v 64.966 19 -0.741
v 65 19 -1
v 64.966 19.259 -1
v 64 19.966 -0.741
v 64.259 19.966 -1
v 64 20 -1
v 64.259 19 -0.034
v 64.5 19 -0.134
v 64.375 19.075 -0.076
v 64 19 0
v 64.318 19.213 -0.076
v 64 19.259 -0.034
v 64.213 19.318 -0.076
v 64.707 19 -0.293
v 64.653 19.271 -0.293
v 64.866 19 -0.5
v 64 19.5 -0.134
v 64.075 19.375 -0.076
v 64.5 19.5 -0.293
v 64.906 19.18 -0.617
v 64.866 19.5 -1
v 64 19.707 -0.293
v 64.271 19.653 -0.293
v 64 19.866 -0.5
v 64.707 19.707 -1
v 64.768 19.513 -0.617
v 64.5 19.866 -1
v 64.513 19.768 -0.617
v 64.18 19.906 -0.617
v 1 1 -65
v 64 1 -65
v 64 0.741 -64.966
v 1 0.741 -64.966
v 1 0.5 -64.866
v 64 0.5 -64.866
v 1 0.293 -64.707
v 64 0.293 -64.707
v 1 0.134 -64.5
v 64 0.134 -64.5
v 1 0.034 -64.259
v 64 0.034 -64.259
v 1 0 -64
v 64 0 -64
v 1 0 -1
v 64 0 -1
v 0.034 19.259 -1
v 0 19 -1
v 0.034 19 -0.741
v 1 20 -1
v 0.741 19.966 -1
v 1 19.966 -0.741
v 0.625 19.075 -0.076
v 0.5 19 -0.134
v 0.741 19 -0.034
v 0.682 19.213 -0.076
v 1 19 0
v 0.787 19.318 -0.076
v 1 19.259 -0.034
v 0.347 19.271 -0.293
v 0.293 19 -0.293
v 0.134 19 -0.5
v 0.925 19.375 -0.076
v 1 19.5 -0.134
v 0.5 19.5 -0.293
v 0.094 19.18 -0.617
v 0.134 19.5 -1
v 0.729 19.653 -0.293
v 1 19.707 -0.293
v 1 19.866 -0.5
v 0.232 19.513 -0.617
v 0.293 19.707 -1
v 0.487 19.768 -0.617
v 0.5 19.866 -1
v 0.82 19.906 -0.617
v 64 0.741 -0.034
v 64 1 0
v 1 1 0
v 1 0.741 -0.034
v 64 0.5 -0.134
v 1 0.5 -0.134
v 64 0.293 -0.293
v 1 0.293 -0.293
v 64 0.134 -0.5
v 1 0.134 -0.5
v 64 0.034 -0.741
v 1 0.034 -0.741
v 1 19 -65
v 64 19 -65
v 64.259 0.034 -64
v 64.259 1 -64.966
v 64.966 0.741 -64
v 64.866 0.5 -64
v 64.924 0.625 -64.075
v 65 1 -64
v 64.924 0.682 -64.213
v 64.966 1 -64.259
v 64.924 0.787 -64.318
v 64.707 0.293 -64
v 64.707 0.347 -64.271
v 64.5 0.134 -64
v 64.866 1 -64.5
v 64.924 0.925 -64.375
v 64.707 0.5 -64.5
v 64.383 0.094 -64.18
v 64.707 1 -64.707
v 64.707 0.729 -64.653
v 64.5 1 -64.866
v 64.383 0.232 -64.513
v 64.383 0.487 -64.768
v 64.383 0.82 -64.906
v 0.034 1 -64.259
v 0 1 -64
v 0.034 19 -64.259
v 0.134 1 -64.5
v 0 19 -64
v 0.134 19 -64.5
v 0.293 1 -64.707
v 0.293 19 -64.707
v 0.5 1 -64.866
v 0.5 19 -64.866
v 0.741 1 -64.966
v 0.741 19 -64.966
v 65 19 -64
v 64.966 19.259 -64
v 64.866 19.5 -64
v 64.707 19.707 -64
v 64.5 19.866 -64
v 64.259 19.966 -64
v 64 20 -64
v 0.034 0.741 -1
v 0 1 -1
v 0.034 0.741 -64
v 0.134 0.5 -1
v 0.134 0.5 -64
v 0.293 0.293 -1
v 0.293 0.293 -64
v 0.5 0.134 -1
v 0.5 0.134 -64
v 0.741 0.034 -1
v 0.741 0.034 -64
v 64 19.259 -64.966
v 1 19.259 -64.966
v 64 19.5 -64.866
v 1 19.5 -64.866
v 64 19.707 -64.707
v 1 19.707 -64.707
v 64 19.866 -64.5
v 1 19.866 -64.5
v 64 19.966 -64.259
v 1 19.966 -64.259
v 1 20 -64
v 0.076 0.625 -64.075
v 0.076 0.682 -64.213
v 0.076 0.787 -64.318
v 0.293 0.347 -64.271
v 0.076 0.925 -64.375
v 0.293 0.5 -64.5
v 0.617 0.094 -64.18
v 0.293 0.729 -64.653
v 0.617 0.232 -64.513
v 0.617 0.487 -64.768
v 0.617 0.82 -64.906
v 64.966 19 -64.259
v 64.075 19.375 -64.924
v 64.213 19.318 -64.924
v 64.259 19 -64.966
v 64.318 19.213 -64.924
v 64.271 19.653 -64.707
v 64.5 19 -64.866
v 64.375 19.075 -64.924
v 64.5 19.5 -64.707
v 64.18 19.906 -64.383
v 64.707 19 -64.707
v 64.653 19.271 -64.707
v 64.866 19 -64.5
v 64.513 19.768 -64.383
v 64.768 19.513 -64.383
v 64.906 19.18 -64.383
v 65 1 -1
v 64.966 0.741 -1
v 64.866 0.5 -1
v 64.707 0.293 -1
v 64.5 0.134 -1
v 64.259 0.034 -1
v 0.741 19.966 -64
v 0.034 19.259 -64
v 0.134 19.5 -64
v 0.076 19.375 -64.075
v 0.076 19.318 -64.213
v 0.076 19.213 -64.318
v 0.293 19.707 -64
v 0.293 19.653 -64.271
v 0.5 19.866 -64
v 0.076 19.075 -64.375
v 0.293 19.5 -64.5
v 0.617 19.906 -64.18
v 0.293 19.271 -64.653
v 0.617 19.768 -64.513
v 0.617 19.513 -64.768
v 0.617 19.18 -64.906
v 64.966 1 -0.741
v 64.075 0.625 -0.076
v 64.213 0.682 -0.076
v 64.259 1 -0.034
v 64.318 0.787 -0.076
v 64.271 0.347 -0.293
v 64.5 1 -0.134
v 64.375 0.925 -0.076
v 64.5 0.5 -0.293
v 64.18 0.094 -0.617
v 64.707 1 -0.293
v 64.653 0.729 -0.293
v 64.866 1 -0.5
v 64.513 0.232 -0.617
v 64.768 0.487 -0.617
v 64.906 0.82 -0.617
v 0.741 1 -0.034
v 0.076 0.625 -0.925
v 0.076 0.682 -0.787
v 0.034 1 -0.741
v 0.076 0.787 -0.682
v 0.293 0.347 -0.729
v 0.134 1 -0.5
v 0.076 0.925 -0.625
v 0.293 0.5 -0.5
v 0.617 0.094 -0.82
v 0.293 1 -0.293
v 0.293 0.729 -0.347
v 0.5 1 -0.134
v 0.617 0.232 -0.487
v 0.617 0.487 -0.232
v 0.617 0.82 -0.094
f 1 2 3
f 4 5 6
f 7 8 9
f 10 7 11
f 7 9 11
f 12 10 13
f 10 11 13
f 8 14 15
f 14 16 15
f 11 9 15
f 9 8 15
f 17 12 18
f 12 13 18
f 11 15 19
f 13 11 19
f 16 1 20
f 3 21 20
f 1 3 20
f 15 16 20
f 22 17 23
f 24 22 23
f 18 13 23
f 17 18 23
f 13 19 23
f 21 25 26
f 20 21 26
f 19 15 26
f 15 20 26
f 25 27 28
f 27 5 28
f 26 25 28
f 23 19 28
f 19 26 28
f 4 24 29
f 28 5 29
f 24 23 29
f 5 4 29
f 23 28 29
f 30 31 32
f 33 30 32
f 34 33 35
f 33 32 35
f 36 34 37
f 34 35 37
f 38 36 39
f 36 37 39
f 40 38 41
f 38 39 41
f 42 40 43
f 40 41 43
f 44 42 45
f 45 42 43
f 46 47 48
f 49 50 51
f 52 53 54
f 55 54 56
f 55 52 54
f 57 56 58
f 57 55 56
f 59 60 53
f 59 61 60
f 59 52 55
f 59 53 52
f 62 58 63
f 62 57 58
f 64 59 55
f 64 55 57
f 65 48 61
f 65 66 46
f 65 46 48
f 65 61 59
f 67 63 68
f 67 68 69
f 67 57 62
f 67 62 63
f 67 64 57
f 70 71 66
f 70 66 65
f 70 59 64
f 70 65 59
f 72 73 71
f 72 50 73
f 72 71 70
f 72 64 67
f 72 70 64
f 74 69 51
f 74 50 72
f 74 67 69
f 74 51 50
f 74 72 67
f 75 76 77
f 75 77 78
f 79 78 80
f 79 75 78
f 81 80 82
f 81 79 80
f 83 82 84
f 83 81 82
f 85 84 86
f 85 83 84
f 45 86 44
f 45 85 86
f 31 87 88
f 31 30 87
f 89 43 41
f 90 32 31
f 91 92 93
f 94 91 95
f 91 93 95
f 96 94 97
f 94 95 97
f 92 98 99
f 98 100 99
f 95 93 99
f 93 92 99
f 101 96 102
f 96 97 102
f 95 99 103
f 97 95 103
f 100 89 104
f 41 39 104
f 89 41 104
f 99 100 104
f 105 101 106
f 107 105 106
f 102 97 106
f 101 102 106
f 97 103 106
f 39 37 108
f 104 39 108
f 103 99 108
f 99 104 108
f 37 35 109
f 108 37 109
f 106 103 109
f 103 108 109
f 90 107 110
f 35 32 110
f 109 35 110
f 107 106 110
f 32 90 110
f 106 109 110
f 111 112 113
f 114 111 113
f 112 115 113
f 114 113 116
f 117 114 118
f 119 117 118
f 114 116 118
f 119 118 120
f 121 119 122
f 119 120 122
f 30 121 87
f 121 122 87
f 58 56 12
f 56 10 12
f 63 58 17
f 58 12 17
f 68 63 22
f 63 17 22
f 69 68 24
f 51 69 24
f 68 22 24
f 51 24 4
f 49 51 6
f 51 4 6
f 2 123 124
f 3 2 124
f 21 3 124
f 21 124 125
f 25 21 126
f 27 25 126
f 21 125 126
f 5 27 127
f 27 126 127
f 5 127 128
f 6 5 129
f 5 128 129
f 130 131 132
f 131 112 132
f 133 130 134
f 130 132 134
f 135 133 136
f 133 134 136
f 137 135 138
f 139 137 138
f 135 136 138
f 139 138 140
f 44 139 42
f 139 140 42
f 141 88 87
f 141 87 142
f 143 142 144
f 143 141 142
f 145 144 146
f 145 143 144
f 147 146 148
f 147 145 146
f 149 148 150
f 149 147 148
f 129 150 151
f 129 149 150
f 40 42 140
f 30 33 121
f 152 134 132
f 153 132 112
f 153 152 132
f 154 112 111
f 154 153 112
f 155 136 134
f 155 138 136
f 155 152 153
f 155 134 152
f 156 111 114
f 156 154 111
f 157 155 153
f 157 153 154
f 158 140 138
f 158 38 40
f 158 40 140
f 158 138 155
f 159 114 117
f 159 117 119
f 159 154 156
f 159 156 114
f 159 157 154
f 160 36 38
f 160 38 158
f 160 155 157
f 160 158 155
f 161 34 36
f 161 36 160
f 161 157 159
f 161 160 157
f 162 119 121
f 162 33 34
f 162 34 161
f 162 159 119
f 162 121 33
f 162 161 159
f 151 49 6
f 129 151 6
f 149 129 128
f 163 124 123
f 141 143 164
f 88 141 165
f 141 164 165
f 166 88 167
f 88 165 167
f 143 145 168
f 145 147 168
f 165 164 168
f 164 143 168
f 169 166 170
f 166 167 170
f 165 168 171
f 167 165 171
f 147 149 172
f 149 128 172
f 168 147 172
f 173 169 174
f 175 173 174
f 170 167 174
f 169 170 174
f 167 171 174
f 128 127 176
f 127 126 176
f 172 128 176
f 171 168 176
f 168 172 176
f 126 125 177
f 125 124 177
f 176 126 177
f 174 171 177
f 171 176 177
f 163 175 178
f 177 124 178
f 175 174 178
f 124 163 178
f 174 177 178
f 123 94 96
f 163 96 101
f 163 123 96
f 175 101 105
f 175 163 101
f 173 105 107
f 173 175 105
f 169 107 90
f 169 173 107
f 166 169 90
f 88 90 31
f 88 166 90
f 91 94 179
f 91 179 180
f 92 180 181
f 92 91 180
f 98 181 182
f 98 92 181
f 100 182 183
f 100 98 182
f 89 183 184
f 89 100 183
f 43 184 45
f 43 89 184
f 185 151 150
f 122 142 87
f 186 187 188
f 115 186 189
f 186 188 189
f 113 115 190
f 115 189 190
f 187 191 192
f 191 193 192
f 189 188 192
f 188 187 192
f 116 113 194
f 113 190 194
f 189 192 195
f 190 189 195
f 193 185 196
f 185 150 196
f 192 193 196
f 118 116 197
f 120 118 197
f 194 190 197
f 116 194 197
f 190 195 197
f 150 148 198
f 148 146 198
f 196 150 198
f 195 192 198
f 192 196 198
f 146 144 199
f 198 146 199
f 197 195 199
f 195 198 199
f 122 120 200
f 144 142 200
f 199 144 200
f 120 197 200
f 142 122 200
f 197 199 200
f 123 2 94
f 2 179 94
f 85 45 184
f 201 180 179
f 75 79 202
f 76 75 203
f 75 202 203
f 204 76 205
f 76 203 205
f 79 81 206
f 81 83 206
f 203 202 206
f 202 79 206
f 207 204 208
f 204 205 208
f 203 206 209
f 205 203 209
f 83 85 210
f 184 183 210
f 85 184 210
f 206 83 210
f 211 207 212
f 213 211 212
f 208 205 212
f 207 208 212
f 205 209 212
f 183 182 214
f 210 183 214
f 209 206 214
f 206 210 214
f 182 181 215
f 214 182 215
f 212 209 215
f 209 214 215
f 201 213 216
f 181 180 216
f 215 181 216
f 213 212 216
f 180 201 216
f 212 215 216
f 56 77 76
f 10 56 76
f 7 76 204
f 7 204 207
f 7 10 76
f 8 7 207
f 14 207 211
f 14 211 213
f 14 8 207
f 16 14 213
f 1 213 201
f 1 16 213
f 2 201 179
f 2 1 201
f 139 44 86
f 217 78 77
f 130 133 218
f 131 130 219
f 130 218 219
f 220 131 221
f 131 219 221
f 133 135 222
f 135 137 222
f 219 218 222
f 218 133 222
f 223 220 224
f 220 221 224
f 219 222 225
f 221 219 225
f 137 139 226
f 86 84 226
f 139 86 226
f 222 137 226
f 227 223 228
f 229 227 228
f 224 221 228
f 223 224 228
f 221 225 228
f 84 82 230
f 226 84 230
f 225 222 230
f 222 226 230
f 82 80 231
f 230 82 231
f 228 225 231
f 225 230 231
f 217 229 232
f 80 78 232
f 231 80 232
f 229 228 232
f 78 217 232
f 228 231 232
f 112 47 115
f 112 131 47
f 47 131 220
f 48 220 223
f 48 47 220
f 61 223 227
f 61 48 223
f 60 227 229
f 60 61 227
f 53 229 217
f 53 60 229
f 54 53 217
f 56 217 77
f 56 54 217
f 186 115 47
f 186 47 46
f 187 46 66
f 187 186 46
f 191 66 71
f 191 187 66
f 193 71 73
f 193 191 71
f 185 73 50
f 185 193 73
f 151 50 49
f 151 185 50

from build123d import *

# Parameters (mm, degrees)
SKETCH1_W           = 65
SKETCH1_H           = 65
BOSS_EXTRUDE1_DEPTH = 20
FILLET1_R           = 1
BOSS_EXTRUDE2_DEPTH = 2


with BuildPart() as part:
    # Sketch1 → Boss-Extrude1 (new body)
    with BuildSketch(Plane(origin=(0, 0, 0), x_dir=(1, 0, 0), z_dir=(0, 1, 0))):
        with Locations((32.5, 32.5)):
            Rectangle(SKETCH1_W, SKETCH1_H)
    extrude(amount=BOSS_EXTRUDE1_DEPTH)

    # Fillet1
    fillet1_edges = [part.edges().sort_by_distance(p)[0] for p in [
        (65, 20, -32.5),
        (32.5, 20, -65),
        (0, 20, -32.5),
        (32.5, 0, -65),
        (65, 0, -32.5),
        (32.5, 0, 0),
        (0, 0, -32.5),
        (0, 10, -65),
        (65, 10, -65),
        (65, 10, 0),
        (0, 10, 0),
        (32.5, 20, 0),
    ]]
    fillet(fillet1_edges, radius=FILLET1_R)

    # Sketch5 → Boss-Extrude2 (add)
    with BuildSketch(Plane(origin=(0, 20, 0), x_dir=(1, 0, 0), z_dir=(0, 1, 0))):
        Polygon((19.685637492, 45.314362508), (24.766822527, 50.395547542), (25.276108448, 49.886261621), (20.194923413, 44.805076587), align=None)
        with BuildLine():
            Line((24.270811136, 43.09904656), (24.718807634, 42.493448688))
            add(Edge.make_bspline(
                [(24.718807634, 42.493448688), (24.65944603, 42.457112102), (24.543657841, 42.386235522), (24.36613492, 42.296211036), (24.192297686, 42.219040325), (24.01995098, 42.159212632), (23.849730523, 42.114752837), (23.681690942, 42.086719988), (23.516089318, 42.075383185), (23.353313359, 42.077400194), (23.19429728, 42.097465643), (23.038449433, 42.128495622), (22.887328161, 42.177860051), (22.740286195, 42.240265036), (22.597438103, 42.3173153), (22.45826992, 42.40727332), (22.32545788, 42.515129055), (22.241429087, 42.594556655), (22.198644924, 42.63499807)],
                knots=[0, 0, 0, 0, 0.000208722, 0.000407124, 0.000596633, 0.000778925, 0.00095377, 0.001123861, 0.001289171, 0.001451177, 0.001611365, 0.001769344, 0.001927175, 0.002087363, 0.002247969, 0.002413511, 0.002583753, 0.002760349, 0.002760349, 0.002760349, 0.002760349], degree=3))
            add(Edge.make_bspline(
                [(22.198644924, 42.63499807), (22.147701284, 42.688346884), (22.04765429, 42.793117339), (21.922554095, 42.967231051), (21.817569235, 43.147019722), (21.73659792, 43.335189786), (21.679785512, 43.530848968), (21.644085884, 43.733421879), (21.633386128, 43.943953589), (21.643285872, 44.161113728), (21.677814894, 44.38377928), (21.742580127, 44.606907144), (21.828375675, 44.832560204), (21.944279573, 45.056953333), (22.083016879, 45.284675208), (22.25070644, 45.510705787), (22.440615653, 45.740739094), (22.58325937, 45.886785575), (22.656856326, 45.962138185)],
                knots=[0, 0, 0, 0, 0.000221059, 0.000434133, 0.00064138, 0.000844681, 0.001046936, 0.001251338, 0.00146034, 0.001678012, 0.001902569, 0.002134488, 0.002373782, 0.002625691, 0.002890982, 0.003172935, 0.003469264, 0.003785121, 0.003785121, 0.003785121, 0.003785121], degree=3))
            add(Edge.make_bspline(
                [(22.656856326, 45.962138185), (22.735304815, 46.037955999), (22.88748258, 46.185030666), (23.123303486, 46.384632603), (23.357638034, 46.557100392), (23.590677334, 46.702822596), (23.821840648, 46.822078206), (24.051852, 46.914709279), (24.280409589, 46.981983021), (24.506932694, 47.018796963), (24.727384439, 47.03431778), (24.940233058, 47.025482357), (25.144352505, 46.994971105), (25.340085808, 46.942519294), (25.526286742, 46.866215225), (25.702710621, 46.766561684), (25.872394562, 46.647715855), (25.973496188, 46.551133092), (26.024856056, 46.502068817)],
                knots=[0, 0, 0, 0, 0.000327232, 0.000634778, 0.000926067, 0.001199391, 0.001458489, 0.001705352, 0.00194228, 0.002171628, 0.00239246, 0.002604236, 0.002809376, 0.003010444, 0.003210705, 0.003411263, 0.003617372, 0.003830186, 0.003830186, 0.003830186, 0.003830186], degree=3))
            add(Edge.make_bspline(
                [(26.024856056, 46.502068817), (26.071398533, 46.453066353), (26.163167054, 46.356447435), (26.277023523, 46.193668973), (26.37086823, 46.023021925), (26.443461426, 45.842869536), (26.493233934, 45.653122307), (26.520175644, 45.45373442), (26.527595943, 45.24544748), (26.512535805, 45.029344415), (26.475308317, 44.807364737), (26.409425794, 44.583426164), (26.320915695, 44.357268318), (26.201043695, 44.132062546), (26.060507567, 43.902626648), (25.89079672, 43.673437755), (25.696655056, 43.442073581), (25.552080753, 43.293670825), (25.477629063, 43.21724759)],
                knots=[0, 0, 0, 0, 0.000202508, 0.000399288, 0.000593897, 0.000785751, 0.000980426, 0.001180814, 0.001388159, 0.001604624, 0.001829655, 0.002061973, 0.002303688, 0.00255693, 0.002826235, 0.003110228, 0.003411606, 0.003731589, 0.003731589, 0.003731589, 0.003731589], degree=3))
            Line((25.477629063, 43.21724759), (25.308353514, 43.053809128))
            Line((25.308353514, 43.053809128), (23.055237576, 45.306925066))
            add(Edge.make_bspline(
                [(23.055237576, 45.306925066), (23.008428941, 45.253428574), (22.917532008, 45.149544603), (22.794995519, 44.99005008), (22.687606361, 44.834345409), (22.598042408, 44.680102339), (22.523988968, 44.528378877), (22.46893383, 44.377973841), (22.428484602, 44.230679765), (22.404672414, 44.086328807), (22.398574981, 43.946465898), (22.401417614, 43.812435439), (22.421043899, 43.684765665), (22.452728022, 43.563194715), (22.498625025, 43.448182852), (22.557092061, 43.339791827), (22.629175623, 43.237817936), (22.686267844, 43.176729605), (22.715227205, 43.145743263)],
                knots=[0, 0, 0, 0, 0.000213204, 0.000414017, 0.000603036, 0.00078024, 0.000948633, 0.00110884, 0.001259993, 0.001406336, 0.001546616, 0.001679481, 0.001807848, 0.00193315, 0.002055633, 0.002178385, 0.002301882, 0.002429006, 0.002429006, 0.002429006, 0.002429006], degree=3))
            add(Edge.make_bspline(
                [(22.715227205, 43.145743263), (22.763714327, 43.101268255), (22.858414682, 43.014403973), (23.025956737, 42.922340751), (23.204141766, 42.861085255), (23.396323147, 42.841646968), (23.600048933, 42.851176309), (23.814991722, 42.901604999), (24.042730565, 42.981679607), (24.192378727, 43.05868638), (24.270811136, 43.09904656)],
                knots=[0, 0, 0, 0, 0.000196748, 0.000384268, 0.000568853, 0.000758368, 0.000960006, 0.001178117, 0.001418122, 0.001682448, 0.001682448, 0.001682448, 0.001682448], degree=3))
        make_face()
        with BuildLine():
            Line((23.598086753, 45.788484819), (25.282086618, 44.104484954))
            add(Edge.make_bspline(
                [(25.282086618, 44.104484954), (25.317456152, 44.146521608), (25.385900663, 44.227867836), (25.479775603, 44.350787831), (25.561877228, 44.470464632), (25.632124497, 44.587358235), (25.691145975, 44.700570312), (25.736058611, 44.811350606), (25.773087872, 44.917520401), (25.786377298, 44.989073722), (25.792831811, 45.023826301)],
                knots=[0, 0, 0, 0, 0.000164794, 0.000318898, 0.0004638, 0.000599943, 0.000727861, 0.000846287, 0.000958423, 0.001064318, 0.001064318, 0.001064318, 0.001064318], degree=3))
            add(Edge.make_bspline(
                [(25.792831811, 45.023826301), (25.799813725, 45.071878299), (25.813377134, 45.165226467), (25.814257222, 45.30339848), (25.801182934, 45.435020893), (25.774145727, 45.560903067), (25.729739188, 45.679965001), (25.670458197, 45.791928238), (25.597330146, 45.898165534), (25.538293331, 45.961856188), (25.508273775, 45.994242168)],
                knots=[0, 0, 0, 0, 0.000145525, 0.000282705, 0.000413242, 0.000541766, 0.000667814, 0.000793141, 0.000921059, 0.001053395, 0.001053395, 0.001053395, 0.001053395], degree=3))
            add(Edge.make_bspline(
                [(25.508273775, 45.994242168), (25.479202656, 46.021698757), (25.422234743, 46.075502829), (25.327077988, 46.143572618), (25.226022071, 46.198991516), (25.119469498, 46.243146809), (25.006665555, 46.273929901), (24.888728253, 46.292595438), (24.764604833, 46.299684032), (24.636059667, 46.29554037), (24.504591069, 46.27783771), (24.372662252, 46.247016845), (24.241600945, 46.202755032), (24.110298143, 46.147206738), (23.980677113, 46.076811617), (23.852388098, 45.992570612), (23.722553615, 45.897996438), (23.640333437, 45.825655378), (23.598086753, 45.788484819)],
                knots=[0, 0, 0, 0, 0.000119856, 0.00023487, 0.00034982, 0.000464991, 0.000580052, 0.000699766, 0.000822561, 0.00095251, 0.001085007, 0.001219869, 0.001358308, 0.001499526, 0.001647086, 0.001800087, 0.001959736, 0.002128463, 0.002128463, 0.002128463, 0.002128463], degree=3))
        make_face(mode=Mode.SUBTRACT)
        with BuildLine():
            Line((24.256928886, 40.743071114), (27.937212819, 44.423355048))
            Line((27.937212819, 44.423355048), (28.396883493, 43.963684374))
            Line((28.396883493, 43.963684374), (27.874464124, 43.441265005))
            add(Edge.make_bspline(
                [(27.874464124, 43.441265005), (27.950920243, 43.461674048), (28.098922361, 43.501181437), (28.321702162, 43.527286092), (28.534408586, 43.525711262), (28.736967661, 43.492266462), (28.930507375, 43.434748033), (29.112252205, 43.344942514), (29.285821773, 43.23105084), (29.388065649, 43.135461808), (29.440262959, 43.086661914)],
                knots=[0, 0, 0, 0, 0.00023714, 0.00045905, 0.000670664, 0.000873146, 0.001073023, 0.001274043, 0.001479241, 0.001693257, 0.001693257, 0.001693257, 0.001693257], degree=3))
            add(Edge.make_bspline(
                [(29.440262959, 43.086661914), (29.479237571, 43.045701744), (29.555948444, 42.965082845), (29.651727199, 42.830729926), (29.733688037, 42.691079746), (29.796795775, 42.54476151), (29.843933405, 42.396078746), (29.872725772, 42.248190754), (29.887408477, 42.10287992), (29.880498237, 41.958770633), (29.857841761, 41.814281782), (29.811728374, 41.668054182), (29.749403454, 41.518247208), (29.680906385, 41.391900736), (29.614240997, 41.286817058), (29.55205399, 41.200752274), (29.481461369, 41.107516401), (29.397994108, 41.009652562), (29.307522476, 40.903718375), (29.205603934, 40.792000351), (29.093727999, 40.674235372), (29.014326282, 40.594545181), (28.973295925, 40.553365757)],
                knots=[0, 0, 0, 0, 0.000169426, 0.00033347, 0.000493658, 0.000654423, 0.000810422, 0.00096067, 0.001105734, 0.001247403, 0.001392305, 0.001543261, 0.001706138, 0.001878505, 0.001973638, 0.002079322, 0.002196945, 0.00232437, 0.002465082, 0.002614877, 0.002777963, 0.00295235, 0.00295235, 0.00295235, 0.00295235], degree=3))
            Line((28.973295925, 40.553365757), (26.709965084, 38.290034916))
            Line((26.709965084, 38.290034916), (26.197760619, 38.802239381))
            Line((26.197760619, 38.802239381), (28.436283837, 41.040762598))
            add(Edge.make_bspline(
                [(28.436283837, 41.040762598), (28.498834303, 41.104732657), (28.614954251, 41.223487965), (28.764812047, 41.398480511), (28.879101321, 41.554577542), (28.960654173, 41.695654959), (29.012514868, 41.828209488), (29.040075072, 41.956841821), (29.050277675, 42.084305362), (29.036279506, 42.209999528), (29.003709911, 42.331703897), (28.954677983, 42.448518613), (28.882691104, 42.556276666), (28.823880395, 42.620443943), (28.793805472, 42.653258136)],
                knots=[0, 0, 0, 0, 0.000268355, 0.00049818, 0.00069055, 0.000848023, 0.00098569, 0.001115639, 0.001241442, 0.001367624, 0.001492926, 0.001618432, 0.001745925, 0.001879358, 0.001879358, 0.001879358, 0.001879358], degree=3))
            add(Edge.make_bspline(
                [(28.793805472, 42.653258136), (28.763187059, 42.682046242), (28.702932566, 42.738698845), (28.605315182, 42.81236554), (28.502003168, 42.870205812), (28.396735111, 42.918527741), (28.285997777, 42.950250802), (28.171905723, 42.969342191), (28.053919522, 42.97490495), (27.931901325, 42.967925543), (27.804732482, 42.94415941), (27.673021679, 42.901129229), (27.536350163, 42.838100954), (27.393143948, 42.75815232), (27.246606826, 42.656239788), (27.093618898, 42.536931702), (26.935494109, 42.398840319), (26.83109022, 42.297220606), (26.777091595, 42.244661982)],
                knots=[0, 0, 0, 0, 0.000126039, 0.000248035, 0.000365685, 0.000480662, 0.000594719, 0.000710112, 0.000827, 0.000948339, 0.00107599, 0.001213974, 0.001362884, 0.001526876, 0.001705373, 0.001897736, 0.002108731, 0.002334768, 0.002334768, 0.002334768, 0.002334768], degree=3))
            Line((26.777091595, 42.244661982), (24.766214807, 40.233785193))
            Line((24.766214807, 40.233785193), (24.256928886, 40.743071114))
        make_face()
        with BuildLine():
            Line((28.397593963, 38.800069639), (28.998814018, 38.391473485))
            add(Edge.make_bspline(
                [(28.998814018, 38.391473485), (28.971522035, 38.355862259), (28.918530346, 38.286717449), (28.850053452, 38.179416628), (28.791547054, 38.074906972), (28.743199129, 37.971463994), (28.709297745, 37.868277663), (28.683201074, 37.767042009), (28.670469797, 37.667078287), (28.666043136, 37.536705125), (28.688594893, 37.374482586), (28.758670326, 37.187340011), (28.866105164, 37.006369777), (28.964064917, 36.900834271), (29.01486601, 36.846104458)],
                knots=[0, 0, 0, 0, 0.000134546, 0.000261243, 0.000381436, 0.000493752, 0.00060312, 0.00070682, 0.000806916, 0.000904731, 0.001097692, 0.00129343, 0.001500898, 0.001724391, 0.001724391, 0.001724391, 0.001724391], degree=3))
            add(Edge.make_bspline(
                [(29.01486601, 36.846104458), (29.069441835, 36.795835111), (29.172990452, 36.700457326), (29.342679441, 36.588820454), (29.516720057, 36.519990136), (29.690805894, 36.489543092), (29.859716906, 36.498403237), (30.01876995, 36.541915162), (30.16708271, 36.618757165), (30.250415812, 36.693776173), (30.293188265, 36.732281244)],
                knots=[0, 0, 0, 0, 0.000222389, 0.000421947, 0.000605404, 0.000780054, 0.000948098, 0.001108466, 0.00127165, 0.001443733, 0.001443733, 0.001443733, 0.001443733], degree=3))
            add(Edge.make_bspline(
                [(30.293188265, 36.732281244), (30.326160082, 36.768383514), (30.389471047, 36.83770543), (30.452583476, 36.961547014), (30.483616436, 37.093216642), (30.478287487, 37.18210217), (30.475597262, 37.226974445)],
                knots=[0, 0, 0, 0, 0.000146109, 0.000280553, 0.000412243, 0.000546504, 0.000546504, 0.000546504, 0.000546504], degree=3))
            add(Edge.make_bspline(
                [(30.475597262, 37.226974445), (30.472436749, 37.244538199), (30.465345915, 37.283943725), (30.447476422, 37.347936753), (30.420458765, 37.422708398), (30.385593212, 37.508478052), (30.341249593, 37.604367281), (30.290137516, 37.711619684), (30.229915462, 37.829400163), (30.187187713, 37.911880955), (30.164772331, 37.955151163)],
                knots=[0, 0, 0, 0, 5.3518e-05, 0.000120071, 0.000198993, 0.000291941, 0.000397735, 0.000515873, 0.000648354, 0.000794551, 0.000794551, 0.000794551, 0.000794551], degree=3))
            add(Edge.make_bspline(
                [(30.164772331, 37.955151163), (30.132090575, 38.017850384), (30.069445542, 38.138033488), (29.980891546, 38.311481042), (29.906007385, 38.472488345), (29.838085929, 38.617626828), (29.782172165, 38.748899705), (29.738643504, 38.866657164), (29.702585494, 38.969246159), (29.671389798, 39.087584192), (29.651000577, 39.227233321), (29.645328094, 39.392084984), (29.66561401, 39.556940667), (29.706464713, 39.720228472), (29.768908951, 39.881076669), (29.855399766, 40.034931713), (29.960088954, 40.184138289), (30.045337829, 40.273512063), (30.088890188, 40.31917177)],
                knots=[0, 0, 0, 0, 0.000212122, 0.0004066, 0.000584152, 0.000744778, 0.000887339, 0.001012019, 0.001121387, 0.001213414, 0.001378724, 0.00154368, 0.001706766, 0.001875235, 0.002047583, 0.002222629, 0.002403632, 0.002592691, 0.002592691, 0.002592691, 0.002592691], degree=3))
            add(Edge.make_bspline(
                [(30.088890188, 40.31917177), (30.128032615, 40.356994116), (30.204637433, 40.431015431), (30.329853162, 40.525425421), (30.457257226, 40.606915946), (30.589343694, 40.672832991), (30.725094725, 40.72443303), (30.865240049, 40.759511449), (31.009011182, 40.779880625), (31.15574204, 40.785985308), (31.303476447, 40.77552129), (31.450575101, 40.749648993), (31.595190228, 40.704455907), (31.739136944, 40.646670282), (31.880006672, 40.570079835), (32.016772837, 40.474711543), (32.155421954, 40.367907691), (32.241136901, 40.284569229), (32.285094518, 40.241830356)],
                knots=[0, 0, 0, 0, 0.000163152, 0.0003193, 0.000469499, 0.000616336, 0.000761341, 0.000904327, 0.001048787, 0.001196289, 0.001344029, 0.001492302, 0.001643257, 0.00179772, 0.001957041, 0.002122988, 0.002297565, 0.00248134, 0.00248134, 0.00248134, 0.00248134], degree=3))
            add(Edge.make_bspline(
                [(32.285094518, 40.241830356), (32.337852306, 40.185948728), (32.440535985, 40.077185051), (32.571187106, 39.900500906), (32.677552367, 39.719402205), (32.756128791, 39.533579644), (32.810566231, 39.348425774), (32.840497313, 39.166043217), (32.845606599, 38.987690971), (32.823451513, 38.810732341), (32.769345652, 38.630694319), (32.684733386, 38.442518618), (32.568144059, 38.242589122), (32.471765986, 38.111840057), (32.420806812, 38.042707482)],
                knots=[0, 0, 0, 0, 0.000230385, 0.000448403, 0.000657645, 0.000859029, 0.001052062, 0.00123535, 0.001411976, 0.001585556, 0.001767965, 0.001973769, 0.002203283, 0.002460794, 0.002460794, 0.002460794, 0.002460794], degree=3))
            Line((32.420806812, 38.042707482), (31.838557292, 38.458599996))
            add(Edge.make_bspline(
                [(31.838557292, 38.458599996), (31.879401728, 38.51282359), (31.956839937, 38.615627749), (32.038231596, 38.782456396), (32.088056737, 38.946173696), (32.097929335, 39.108657145), (32.074764551, 39.268501518), (32.011217909, 39.423461233), (31.917510187, 39.578116516), (31.831252687, 39.668893474), (31.7860235, 39.716492443)],
                knots=[0, 0, 0, 0, 0.000203232, 0.000385314, 0.00055389, 0.000713278, 0.000869713, 0.001034204, 0.001212402, 0.001408846, 0.001408846, 0.001408846, 0.001408846], degree=3))
            add(Edge.make_bspline(
                [(31.7860235, 39.716492443), (31.732905563, 39.767245769), (31.632896426, 39.862802875), (31.471323107, 39.973278235), (31.314661986, 40.048901469), (31.161343523, 40.083293574), (31.016122049, 40.084183944), (30.881109182, 40.052442759), (30.756185721, 39.992096689), (30.687338587, 39.930412026), (30.652169172, 39.89890144)],
                knots=[0, 0, 0, 0, 0.000220079, 0.00041436, 0.00058477, 0.000738777, 0.000881786, 0.001016648, 0.001151739, 0.001292814, 0.001292814, 0.001292814, 0.001292814], degree=3))
            add(Edge.make_bspline(
                [(30.652169172, 39.89890144), (30.620980875, 39.864787494), (30.56085833, 39.799025094), (30.505240554, 39.679362067), (30.475944511, 39.552357767), (30.483423349, 39.466101156), (30.487271438, 39.421719503)],
                knots=[0, 0, 0, 0, 0.000137892, 0.000265817, 0.000391179, 0.000524045, 0.000524045, 0.000524045, 0.000524045], degree=3))
            add(Edge.make_bspline(
                [(30.487271438, 39.421719503), (30.490395657, 39.405599282), (30.497591674, 39.368469557), (30.51761967, 39.306581144), (30.547778094, 39.231420948), (30.583137156, 39.140516056), (30.631435245, 39.037519127), (30.684545951, 38.91846373), (30.749096811, 38.786514203), (30.795575431, 38.693983064), (30.81998545, 38.645386809)],
                knots=[0, 0, 0, 0, 4.9227e-05, 0.000113386, 0.000194687, 0.00029224, 0.000405885, 0.000535834, 0.000683336, 0.000846488, 0.000846488, 0.000846488, 0.000846488], degree=3))
            add(Edge.make_bspline(
                [(30.81998545, 38.645386809), (30.854241274, 38.578364373), (30.919783653, 38.450128957), (31.010409734, 38.264835791), (31.088680835, 38.096258791), (31.156781293, 37.94468116), (31.213492505, 37.810005253), (31.259398025, 37.691477566), (31.293388142, 37.589773918), (31.322924098, 37.476840305), (31.342727876, 37.346038471), (31.346133978, 37.190906285), (31.326672281, 37.0352135), (31.285351421, 36.879683127), (31.221973226, 36.725730455), (31.136256285, 36.574338558), (31.027588952, 36.425818198), (30.94073455, 36.334418329), (30.895867593, 36.28720329)],
                knots=[0, 0, 0, 0, 0.000225806, 0.000432038, 0.000618757, 0.00078337, 0.000930533, 0.001057094, 0.001164616, 0.001252039, 0.001407031, 0.001560282, 0.001716124, 0.001876112, 0.002041687, 0.002214184, 0.002396896, 0.002592139, 0.002592139, 0.002592139, 0.002592139], degree=3))
            add(Edge.make_bspline(
                [(30.895867593, 36.28720329), (30.851817853, 36.245074856), (30.765912472, 36.162916386), (30.627629082, 36.055078362), (30.484151508, 35.966369126), (30.337376295, 35.892498955), (30.186503854, 35.834808362), (30.030651537, 35.79571987), (29.870826238, 35.771824325), (29.707857867, 35.766324916), (29.544441736, 35.777811936), (29.382528905, 35.807402037), (29.223111606, 35.854369959), (29.065755909, 35.918731104), (28.912773946, 36.003128348), (28.761056762, 36.103050362), (28.612124467, 36.221279404), (28.518484897, 36.311216194), (28.470557562, 36.357248345)],
                knots=[0, 0, 0, 0, 0.000182782, 0.00035646, 0.00052491, 0.000688061, 0.00084878, 0.001008402, 0.001169167, 0.00133271, 0.001496565, 0.001659716, 0.00182549, 0.001994318, 0.002168663, 0.002348769, 0.002538839, 0.002738119, 0.002738119, 0.002738119, 0.002738119], degree=3))
            add(Edge.make_bspline(
                [(28.470557562, 36.357248345), (28.427696267, 36.402468293), (28.343913067, 36.490862078), (28.230344781, 36.628742225), (28.137296187, 36.771840292), (28.057674052, 36.91473211), (27.993735635, 37.059955561), (27.948727467, 37.208502847), (27.91867848, 37.359049844), (27.908110126, 37.511824801), (27.910033188, 37.666380447), (27.931374691, 37.822782558), (27.968283906, 37.981457637), (28.021195898, 38.142021663), (28.089925891, 38.304855974), (28.177404962, 38.468379919), (28.279416872, 38.635292974), (28.357473233, 38.744128509), (28.397593963, 38.800069639)],
                knots=[0, 0, 0, 0, 0.000186906, 0.000365356, 0.000534939, 0.000698221, 0.000855728, 0.001009901, 0.001163013, 0.001315226, 0.001468477, 0.00162595, 0.001787719, 0.001956616, 0.002132518, 0.002317247, 0.002512462, 0.002718922, 0.002718922, 0.002718922, 0.002718922], degree=3))
        make_face()
        with BuildLine():
            Line((32.194011935, 32.805988065), (35.389817571, 36.001793702))
            Line((35.389817571, 36.001793702), (34.935983985, 36.455627287))
            Line((34.935983985, 36.455627287), (35.420462283, 36.940105585))
            Line((35.420462283, 36.940105585), (35.874295868, 36.486271999))
            Line((35.874295868, 36.486271999), (36.266840031, 36.878816162))
            add(Edge.make_bspline(
                [(36.266840031, 36.878816162), (36.335517636, 36.945443651), (36.46397807, 37.070069373), (36.656925909, 37.230565412), (36.833848513, 37.353613251), (36.999247715, 37.439264272), (37.156364433, 37.492449427), (37.310202624, 37.517178985), (37.462874394, 37.519330465), (37.614658158, 37.495309962), (37.765426607, 37.446344255), (37.913452379, 37.370979935), (38.058218961, 37.268451948), (38.146891462, 37.184969378), (38.193079045, 37.141485118)],
                knots=[0, 0, 0, 0, 0.000286976, 0.000536785, 0.00075211, 0.000932234, 0.001093746, 0.001247524, 0.001397836, 0.001549944, 0.001706386, 0.001871497, 0.002046396, 0.002236539, 0.002236539, 0.002236539, 0.002236539], degree=3))
            add(Edge.make_bspline(
                [(38.193079045, 37.141485118), (38.229731778, 37.103635711), (38.305147448, 37.025757799), (38.408411527, 36.894542479), (38.513431492, 36.753923442), (38.576634578, 36.652160706), (38.608971559, 36.600095213)],
                knots=[0, 0, 0, 0, 0.000157959, 0.000325012, 0.000500429, 0.000684204, 0.000684204, 0.000684204, 0.000684204], degree=3))
            Line((38.608971559, 36.600095213), (37.99024024, 36.13312818))
            add(Edge.make_bspline(
                [(37.99024024, 36.13312818), (37.94856809, 36.19474545), (37.868033833, 36.313825004), (37.769353, 36.418330984), (37.721734195, 36.468760735)],
                knots=[0, 0, 0, 0, 0.000222734, 0.000430448, 0.000430448, 0.000430448, 0.000430448], degree=3))
            add(Edge.make_bspline(
                [(37.721734195, 36.468760735), (37.684984469, 36.503325988), (37.616380818, 36.567851707), (37.501351347, 36.6373372), (37.38710354, 36.676508314), (37.269527367, 36.681322992), (37.146066829, 36.648969031), (37.015877585, 36.572935867), (36.868735235, 36.464180863), (36.773005584, 36.370905363), (36.720673617, 36.319914993)],
                knots=[0, 0, 0, 0, 0.000151005, 0.000281893, 0.00040003, 0.000509563, 0.000629898, 0.000777458, 0.000958995, 0.001177905, 0.001177905, 0.001177905, 0.001177905], degree=3))
            Line((36.720673617, 36.319914993), (36.380663246, 35.979904622))
            Line((36.380663246, 35.979904622), (36.970209125, 35.390358742))
            Line((36.970209125, 35.390358742), (36.485730828, 34.905880445))
            Line((36.485730828, 34.905880445), (35.896184948, 35.495426324))
            Line((35.896184948, 35.495426324), (32.700379312, 32.299620688))
            Line((32.700379312, 32.299620688), (32.194011935, 32.805988065))
        make_face()
        Polygon((38.063745009, 35.662701431), (38.781706824, 36.380663246), (39.290992745, 35.871377324), (38.57303093, 35.15341551), align=None)
        Polygon((33.700521789, 31.299478211), (37.380805723, 34.979762145), (37.890091644, 34.470476224), (34.20980771, 30.79019229), align=None)
        Polygon((35.006711293, 29.993288707), (40.087896328, 35.074473741), (40.597182249, 34.56518782), (35.515997215, 29.484002785), align=None)
        with BuildLine():
            Line((38.03921955, 28.075664242), (37.557659797, 27.456932923))
            add(Edge.make_bspline(
                [(37.557659797, 27.456932923), (37.515050023, 27.482745795), (37.43238392, 27.532824672), (37.31718147, 27.612941746), (37.213488023, 27.695009592), (37.151582133, 27.75368446), (37.121337475, 27.782350574)],
                knots=[0, 0, 0, 0, 0.000149424, 0.000289894, 0.000420708, 0.00054567, 0.00054567, 0.00054567, 0.00054567], degree=3))
            add(Edge.make_bspline(
                [(37.121337475, 27.782350574), (37.080520821, 27.826284363), (37.00266627, 27.910084602), (36.905335621, 28.043375934), (36.837471953, 28.179367766), (36.793839433, 28.314754345), (36.776062632, 28.449207905), (36.781793895, 28.580641418), (36.810848404, 28.708565298), (36.851754189, 28.814304299), (36.903226494, 28.900217385), (36.952401532, 28.97672984), (37.017456151, 29.060621154), (37.095235374, 29.154191678), (37.185990582, 29.257605167), (37.289197155, 29.371823644), (37.408036732, 29.493393567), (37.491018667, 29.578231476), (37.534311445, 29.622492541)],
                knots=[0, 0, 0, 0, 0.00017984, 0.000343031, 0.00049313, 0.000633895, 0.000767839, 0.000897845, 0.001026369, 0.001159962, 0.001235802, 0.001326465, 0.001432701, 0.001553961, 0.001691513, 0.00184543, 0.002015715, 0.002201461, 0.002201461, 0.002201461, 0.002201461], degree=3))
            Line((37.534311445, 29.622492541), (39.651715088, 31.739896184))
            Line((39.651715088, 31.739896184), (39.276682189, 32.114929083))
            Line((39.276682189, 32.114929083), (39.761160487, 32.599407381))
            Line((39.761160487, 32.599407381), (40.136193386, 32.224374482))
            Line((40.136193386, 32.224374482), (41.048238373, 33.136419469))
            Line((41.048238373, 33.136419469), (41.931097921, 33.000707175))
            Line((41.931097921, 33.000707175), (40.645479307, 31.715088561))
            Line((40.645479307, 31.715088561), (41.162061588, 31.19850628))
            Line((41.162061588, 31.19850628), (40.67758329, 30.714027982))
            Line((40.67758329, 30.714027982), (40.161001009, 31.230610263))
            Line((40.161001009, 31.230610263), (38.008574839, 29.078184093))
            add(Edge.make_bspline(
                [(38.008574839, 29.078184093), (37.963565468, 29.032602902), (37.882150668, 28.950153768), (37.782632017, 28.831135525), (37.70657419, 28.737041742), (37.67976807, 28.67403323), (37.668564467, 28.647698859)],
                knots=[0, 0, 0, 0, 0.000191971, 0.000347244, 0.000466334, 0.000551848, 0.000551848, 0.000551848, 0.000551848], degree=3))
            add(Edge.make_bspline(
                [(37.668564467, 28.647698859), (37.661368448, 28.616170398), (37.647174638, 28.553981992), (37.667335502, 28.456091259), (37.713318119, 28.360307296), (37.764109452, 28.305966729), (37.791143314, 28.277043776)],
                knots=[0, 0, 0, 0, 9.5969e-05, 0.000189294, 0.000293066, 0.00041115, 0.00041115, 0.00041115, 0.00041115], degree=3))
            add(Edge.make_bspline(
                [(37.791143314, 28.277043776), (37.825644347, 28.245276519), (37.904125739, 28.173013796), (37.99070257, 28.110625921), (38.03921955, 28.075664242)],
                knots=[0, 0, 0, 0, 0.000140576, 0.000319775, 0.000319775, 0.000319775, 0.000319775], degree=3))
        make_face()
        with BuildLine():
            Line((41.242862717, 26.126994978), (41.690859215, 25.521397106))
            add(Edge.make_bspline(
                [(41.690859215, 25.521397106), (41.631497611, 25.485060521), (41.515709422, 25.414183941), (41.338186502, 25.324159455), (41.164349268, 25.246988743), (40.992002561, 25.18716105), (40.821782105, 25.142701255), (40.653742523, 25.114668406), (40.4881409, 25.103331603), (40.32536494, 25.105348613), (40.166348862, 25.125414061), (40.010501015, 25.156444041), (39.859379743, 25.20580847), (39.712337777, 25.268213455), (39.569489684, 25.345263718), (39.430321501, 25.435221738), (39.297509461, 25.543077474), (39.213480668, 25.622505073), (39.170696506, 25.662946489)],
                knots=[0, 0, 0, 0, 0.000208722, 0.000407124, 0.000596633, 0.000778925, 0.00095377, 0.001123861, 0.001289171, 0.001451177, 0.001611365, 0.001769344, 0.001927175, 0.002087363, 0.002247969, 0.002413511, 0.002583753, 0.002760349, 0.002760349, 0.002760349, 0.002760349], degree=3))
            add(Edge.make_bspline(
                [(39.170696506, 25.662946489), (39.119752865, 25.716295302), (39.019705871, 25.821065758), (38.894605676, 25.99517947), (38.789620817, 26.17496814), (38.708649501, 26.363138204), (38.651837093, 26.558797387), (38.616137466, 26.761370297), (38.605437709, 26.971902007), (38.615337453, 27.189062146), (38.649866476, 27.411727698), (38.714631708, 27.634855562), (38.800427257, 27.860508623), (38.916331154, 28.084901752), (39.055068461, 28.312623626), (39.222758022, 28.538654205), (39.412667234, 28.768687513), (39.555310952, 28.914733994), (39.628907907, 28.990086603)],
                knots=[0, 0, 0, 0, 0.000221059, 0.000434133, 0.00064138, 0.000844681, 0.001046936, 0.001251338, 0.00146034, 0.001678012, 0.001902569, 0.002134488, 0.002373782, 0.002625691, 0.002890982, 0.003172935, 0.003469264, 0.003785121, 0.003785121, 0.003785121, 0.003785121], degree=3))
            add(Edge.make_bspline(
                [(39.628907907, 28.990086603), (39.707356397, 29.065904417), (39.859534162, 29.212979085), (40.095355068, 29.412581022), (40.329689615, 29.58504881), (40.562728915, 29.730771014), (40.793892229, 29.850026625), (41.023903582, 29.942657697), (41.252461171, 30.00993144), (41.478984276, 30.046745381), (41.69943602, 30.062266198), (41.91228464, 30.053430775), (42.116404087, 30.022919524), (42.312137389, 29.970467712), (42.498338323, 29.894163644), (42.674762203, 29.794510102), (42.844446144, 29.675664273), (42.94554777, 29.57908151), (42.996907637, 29.530017236)],
                knots=[0, 0, 0, 0, 0.000327232, 0.000634778, 0.000926067, 0.001199391, 0.001458489, 0.001705352, 0.00194228, 0.002171628, 0.00239246, 0.002604236, 0.002809376, 0.003010444, 0.003210705, 0.003411263, 0.003617372, 0.003830186, 0.003830186, 0.003830186, 0.003830186], degree=3))
            add(Edge.make_bspline(
                [(42.996907637, 29.530017236), (43.043450114, 29.481014771), (43.135218636, 29.384395854), (43.249075105, 29.221617392), (43.342919812, 29.050970344), (43.415513007, 28.870817954), (43.465285516, 28.681070726), (43.492227225, 28.481682839), (43.499647524, 28.273395898), (43.484587386, 28.057292834), (43.447359898, 27.835313155), (43.381477375, 27.611374582), (43.292967277, 27.385216736), (43.173095277, 27.160010965), (43.032559148, 26.930575066), (42.862848302, 26.701386173), (42.668706637, 26.470022), (42.524132335, 26.321619244), (42.449680645, 26.245196009)],
                knots=[0, 0, 0, 0, 0.000202508, 0.000399288, 0.000593897, 0.000785751, 0.000980426, 0.001180814, 0.001388159, 0.001604624, 0.001829655, 0.002061973, 0.002303688, 0.00255693, 0.002826235, 0.003110228, 0.003411606, 0.003731589, 0.003731589, 0.003731589, 0.003731589], degree=3))
            Line((42.449680645, 26.245196009), (42.280405095, 26.081757547))
            Line((42.280405095, 26.081757547), (40.027289158, 28.334873484))
            add(Edge.make_bspline(
                [(40.027289158, 28.334873484), (39.980480522, 28.281376993), (39.889583589, 28.177493021), (39.767047101, 28.017998498), (39.659657943, 27.862293828), (39.570093989, 27.708050757), (39.496040549, 27.556327295), (39.440985411, 27.40592226), (39.400536183, 27.258628183), (39.376723995, 27.114277225), (39.370626562, 26.974414317), (39.373469195, 26.840383858), (39.393095481, 26.712714084), (39.424779604, 26.591143133), (39.470676606, 26.47613127), (39.529143643, 26.367740245), (39.601227205, 26.265766354), (39.658319425, 26.204678024), (39.687278787, 26.173691682)],
                knots=[0, 0, 0, 0, 0.000213204, 0.000414017, 0.000603036, 0.00078024, 0.000948633, 0.00110884, 0.001259993, 0.001406336, 0.001546616, 0.001679481, 0.001807848, 0.00193315, 0.002055633, 0.002178385, 0.002301882, 0.002429006, 0.002429006, 0.002429006, 0.002429006], degree=3))
            add(Edge.make_bspline(
                [(39.687278787, 26.173691682), (39.735765909, 26.129216673), (39.830466263, 26.042352392), (39.998008318, 25.950289169), (40.176193347, 25.889033673), (40.368374729, 25.869595386), (40.572100515, 25.879124727), (40.787043303, 25.929553417), (41.014782146, 26.009628025), (41.164430309, 26.086634798), (41.242862717, 26.126994978)],
                knots=[0, 0, 0, 0, 0.000196748, 0.000384268, 0.000568853, 0.000758368, 0.000960006, 0.001178117, 0.001418122, 0.001682448, 0.001682448, 0.001682448, 0.001682448], degree=3))
        make_face()
        with BuildLine():
            Line((40.570138335, 28.816433237), (42.2541382, 27.132433372))
            add(Edge.make_bspline(
                [(42.2541382, 27.132433372), (42.289507734, 27.174470026), (42.357952245, 27.255816254), (42.451827184, 27.37873625), (42.53392881, 27.49841305), (42.604176078, 27.615306653), (42.663197557, 27.728518731), (42.708110193, 27.839299025), (42.745139454, 27.945468819), (42.75842888, 28.01702214), (42.764883393, 28.05177472)],
                knots=[0, 0, 0, 0, 0.000164794, 0.000318898, 0.0004638, 0.000599943, 0.000727861, 0.000846287, 0.000958423, 0.001064318, 0.001064318, 0.001064318, 0.001064318], degree=3))
            add(Edge.make_bspline(
                [(42.764883393, 28.05177472), (42.771865307, 28.099826718), (42.785428716, 28.193174886), (42.786308804, 28.331346899), (42.773234516, 28.462969311), (42.746197308, 28.588851486), (42.701790769, 28.707913419), (42.642509779, 28.819876656), (42.569381728, 28.926113952), (42.510344912, 28.989804606), (42.480325356, 29.022190587)],
                knots=[0, 0, 0, 0, 0.000145525, 0.000282705, 0.000413242, 0.000541766, 0.000667814, 0.000793141, 0.000921059, 0.001053395, 0.001053395, 0.001053395, 0.001053395], degree=3))
            add(Edge.make_bspline(
                [(42.480325356, 29.022190587), (42.451254238, 29.049647175), (42.394286324, 29.103451247), (42.299129569, 29.171521037), (42.198073652, 29.226939935), (42.091521079, 29.271095227), (41.978717137, 29.30187832), (41.860779835, 29.320543856), (41.736656414, 29.327632451), (41.608111249, 29.323488788), (41.476642651, 29.305786129), (41.344713834, 29.274965264), (41.213652526, 29.23070345), (41.082349725, 29.175155156), (40.952728694, 29.104760036), (40.824439679, 29.020519031), (40.694605197, 28.925944857), (40.612385019, 28.853603796), (40.570138335, 28.816433237)],
                knots=[0, 0, 0, 0, 0.000119856, 0.00023487, 0.00034982, 0.000464991, 0.000580052, 0.000699766, 0.000822561, 0.00095251, 0.001085007, 0.001219869, 0.001358308, 0.001499526, 0.001647086, 0.001800087, 0.001959736, 0.002128463, 0.002128463, 0.002128463, 0.002128463], degree=3))
        make_face(mode=Mode.SUBTRACT)
        with BuildLine():
            Line((41.228980467, 23.771019533), (44.909264401, 27.451303466))
            Line((44.909264401, 27.451303466), (45.368935075, 26.991632793))
            Line((45.368935075, 26.991632793), (44.811493178, 26.434190896))
            add(Edge.make_bspline(
                [(44.811493178, 26.434190896), (44.857082737, 26.451115446), (44.944355433, 26.483514336), (45.072731118, 26.524238854), (45.191321051, 26.559222199), (45.300583308, 26.587819531), (45.401186409, 26.606480476), (45.49213213, 26.620156307), (45.574594504, 26.626514217), (45.670637516, 26.624677799), (45.780727504, 26.607602907), (45.902359417, 26.566479099), (46.013289455, 26.504444979), (46.075711452, 26.448123603), (46.107326697, 26.419598177)],
                knots=[0, 0, 0, 0, 0.000145869, 0.000279239, 0.000403919, 0.000516822, 0.000617849, 0.000710717, 0.000792644, 0.000865622, 0.000998536, 0.00112498, 0.001249147, 0.001376573, 0.001376573, 0.001376573, 0.001376573], degree=3))
            add(Edge.make_bspline(
                [(46.107326697, 26.419598177), (46.148139175, 26.373803537), (46.231671259, 26.280074316), (46.324052431, 26.107953941), (46.393464896, 25.911432893), (46.418311138, 25.769770819), (46.431285076, 25.695799274)],
                knots=[0, 0, 0, 0, 0.00018348, 0.000375534, 0.000581379, 0.000806325, 0.000806325, 0.000806325, 0.000806325], degree=3))
            Line((46.431285076, 25.695799274), (45.678300734, 25.290121664))
            add(Edge.make_bspline(
                [(45.678300734, 25.290121664), (45.66813895, 25.341626701), (45.648602219, 25.440648688), (45.596048332, 25.577070099), (45.532250791, 25.699036956), (45.47255771, 25.764477714), (45.443357946, 25.796489041)],
                knots=[0, 0, 0, 0, 0.000157175, 0.00030218, 0.000437397, 0.000566878, 0.000566878, 0.000566878, 0.000566878], degree=3))
            add(Edge.make_bspline(
                [(45.443357946, 25.796489041), (45.415027761, 25.821935808), (45.35875788, 25.872478597), (45.258936831, 25.928441543), (45.148478619, 25.965180092), (45.029197899, 25.983492882), (44.903427196, 25.984167173), (44.775563704, 25.961021756), (44.645965423, 25.91833137), (44.5638069, 25.87464899), (44.521098054, 25.851941376)],
                knots=[0, 0, 0, 0, 0.000113973, 0.000226375, 0.000340357, 0.000461511, 0.000587009, 0.000715839, 0.000849663, 0.000994543, 0.000994543, 0.000994543, 0.000994543], degree=3))
            add(Edge.make_bspline(
                [(44.521098054, 25.851941376), (44.445922363, 25.80687578), (44.293930489, 25.715761161), (44.077929244, 25.556661725), (43.865593485, 25.383171971), (43.733160518, 25.25464557), (43.665964674, 25.189431897)],
                knots=[0, 0, 0, 0, 0.000262807, 0.000531348, 0.000803951, 0.001084739, 0.001084739, 0.001084739, 0.001084739], degree=3))
            Line((43.665964674, 25.189431897), (41.738266388, 23.261733612))
            Line((41.738266388, 23.261733612), (41.228980467, 23.771019533))
        make_face()
        with BuildLine():
            Line((44.114902431, 23.082761171), (44.716122487, 22.674165016))
            add(Edge.make_bspline(
                [(44.716122487, 22.674165016), (44.688830504, 22.638553791), (44.635838815, 22.569408981), (44.56736192, 22.46210816), (44.508855522, 22.357598503), (44.460507597, 22.254155525), (44.426606214, 22.150969195), (44.400509542, 22.04973354), (44.387778265, 21.949769818), (44.383351605, 21.819396656), (44.405903362, 21.657174117), (44.475978795, 21.470031542), (44.583413632, 21.289061309), (44.681373386, 21.183525803), (44.732174479, 21.128795989)],
                knots=[0, 0, 0, 0, 0.000134546, 0.000261243, 0.000381436, 0.000493752, 0.00060312, 0.00070682, 0.000806916, 0.000904731, 0.001097692, 0.00129343, 0.001500898, 0.001724391, 0.001724391, 0.001724391, 0.001724391], degree=3))
            add(Edge.make_bspline(
                [(44.732174479, 21.128795989), (44.786750304, 21.078526643), (44.89029892, 20.983148857), (45.059987909, 20.871511986), (45.234028525, 20.802681667), (45.408114363, 20.772234624), (45.577025375, 20.781094769), (45.736078418, 20.824606693), (45.884391178, 20.901448696), (45.96772428, 20.976467704), (46.010496733, 21.014972775)],
                knots=[0, 0, 0, 0, 0.000222389, 0.000421947, 0.000605404, 0.000780054, 0.000948098, 0.001108466, 0.00127165, 0.001443733, 0.001443733, 0.001443733, 0.001443733], degree=3))
            add(Edge.make_bspline(
                [(46.010496733, 21.014972775), (46.043468551, 21.051075045), (46.106779516, 21.120396962), (46.169891945, 21.244238545), (46.200924905, 21.375908173), (46.195595956, 21.464793702), (46.192905731, 21.509665976)],
                knots=[0, 0, 0, 0, 0.000146109, 0.000280553, 0.000412243, 0.000546504, 0.000546504, 0.000546504, 0.000546504], degree=3))
            add(Edge.make_bspline(
                [(46.192905731, 21.509665976), (46.189745218, 21.52722973), (46.182654383, 21.566635257), (46.16478489, 21.630628284), (46.137767234, 21.70539993), (46.10290168, 21.791169584), (46.058558061, 21.887058812), (46.007445985, 21.994311215), (45.94722393, 22.112091694), (45.904496182, 22.194572487), (45.882080799, 22.237842694)],
                knots=[0, 0, 0, 0, 5.3518e-05, 0.000120071, 0.000198993, 0.000291941, 0.000397735, 0.000515873, 0.000648354, 0.000794551, 0.000794551, 0.000794551, 0.000794551], degree=3))
            add(Edge.make_bspline(
                [(45.882080799, 22.237842694), (45.849399044, 22.300541915), (45.78675401, 22.42072502), (45.698200015, 22.594172574), (45.623315853, 22.755179877), (45.555394398, 22.900318359), (45.499480634, 23.031591236), (45.455951973, 23.149348696), (45.419893962, 23.251937691), (45.388698267, 23.370275724), (45.368309046, 23.509924852), (45.362636562, 23.674776515), (45.382922479, 23.839632198), (45.423773181, 24.002920003), (45.48621742, 24.1637682), (45.572708234, 24.317623244), (45.677397423, 24.46682982), (45.762646297, 24.556203594), (45.806198656, 24.601863302)],
                knots=[0, 0, 0, 0, 0.000212122, 0.0004066, 0.000584152, 0.000744778, 0.000887339, 0.001012019, 0.001121387, 0.001213414, 0.001378724, 0.00154368, 0.001706766, 0.001875235, 0.002047583, 0.002222629, 0.002403632, 0.002592691, 0.002592691, 0.002592691, 0.002592691], degree=3))
            add(Edge.make_bspline(
                [(45.806198656, 24.601863302), (45.845341084, 24.639685648), (45.921945902, 24.713706963), (46.047161631, 24.808116953), (46.174565695, 24.889607478), (46.306652163, 24.955524522), (46.442403194, 25.007124562), (46.582548518, 25.042202981), (46.72631965, 25.062572157), (46.873050509, 25.06867684), (47.020784916, 25.058212822), (47.16788357, 25.032340524), (47.312498696, 24.987147438), (47.456445412, 24.929361814), (47.59731514, 24.852771367), (47.734081306, 24.757403074), (47.872730423, 24.650599222), (47.958445369, 24.56726076), (48.002402986, 24.524521887)],
                knots=[0, 0, 0, 0, 0.000163152, 0.0003193, 0.000469499, 0.000616336, 0.000761341, 0.000904327, 0.001048787, 0.001196289, 0.001344029, 0.001492302, 0.001643257, 0.00179772, 0.001957041, 0.002122988, 0.002297565, 0.00248134, 0.00248134, 0.00248134, 0.00248134], degree=3))
            add(Edge.make_bspline(
                [(48.002402986, 24.524521887), (48.055160774, 24.46864026), (48.157844454, 24.359876583), (48.288495575, 24.183192438), (48.394860836, 24.002093736), (48.47343726, 23.816271176), (48.527874699, 23.631117305), (48.557805782, 23.448734749), (48.562915068, 23.270382503), (48.540759981, 23.093423872), (48.486654121, 22.91338585), (48.402041855, 22.72521015), (48.285452528, 22.525280654), (48.189074455, 22.394531589), (48.13811528, 22.325399013)],
                knots=[0, 0, 0, 0, 0.000230385, 0.000448403, 0.000657645, 0.000859029, 0.001052062, 0.00123535, 0.001411976, 0.001585556, 0.001767965, 0.001973769, 0.002203283, 0.002460794, 0.002460794, 0.002460794, 0.002460794], degree=3))
            Line((48.13811528, 22.325399013), (47.55586576, 22.741291527))
            add(Edge.make_bspline(
                [(47.55586576, 22.741291527), (47.596710197, 22.795515121), (47.674148406, 22.89831928), (47.755540065, 23.065147927), (47.805365206, 23.228865227), (47.815237803, 23.391348676), (47.792073019, 23.55119305), (47.728526378, 23.706152764), (47.634818656, 23.860808047), (47.548561156, 23.951585006), (47.503331969, 23.999183974)],
                knots=[0, 0, 0, 0, 0.000203232, 0.000385314, 0.00055389, 0.000713278, 0.000869713, 0.001034204, 0.001212402, 0.001408846, 0.001408846, 0.001408846, 0.001408846], degree=3))
            add(Edge.make_bspline(
                [(47.503331969, 23.999183974), (47.450214032, 24.0499373), (47.350204895, 24.145494407), (47.188631576, 24.255969766), (47.031970455, 24.331593001), (46.878651992, 24.365985105), (46.733430518, 24.366875476), (46.59841765, 24.33513429), (46.47349419, 24.274788221), (46.404647056, 24.213103557), (46.36947764, 24.181592972)],
                knots=[0, 0, 0, 0, 0.000220079, 0.00041436, 0.00058477, 0.000738777, 0.000881786, 0.001016648, 0.001151739, 0.001292814, 0.001292814, 0.001292814, 0.001292814], degree=3))
            add(Edge.make_bspline(
                [(46.36947764, 24.181592972), (46.338289343, 24.147479025), (46.278166799, 24.081716625), (46.222549023, 23.962053599), (46.19325298, 23.835049299), (46.200731817, 23.748792687), (46.204579907, 23.704411034)],
                knots=[0, 0, 0, 0, 0.000137892, 0.000265817, 0.000391179, 0.000524045, 0.000524045, 0.000524045, 0.000524045], degree=3))
            add(Edge.make_bspline(
                [(46.204579907, 23.704411034), (46.207704125, 23.688290813), (46.214900142, 23.651161089), (46.234928138, 23.589272676), (46.265086563, 23.514112479), (46.300445624, 23.423207587), (46.348743713, 23.320210659), (46.40185442, 23.201155261), (46.466405279, 23.069205734), (46.512883899, 22.976674595), (46.537293918, 22.928078341)],
                knots=[0, 0, 0, 0, 4.9227e-05, 0.000113386, 0.000194687, 0.00029224, 0.000405885, 0.000535834, 0.000683336, 0.000846488, 0.000846488, 0.000846488, 0.000846488], degree=3))
            add(Edge.make_bspline(
                [(46.537293918, 22.928078341), (46.571549743, 22.861055904), (46.637092121, 22.732820488), (46.727718202, 22.547527322), (46.805989304, 22.378950322), (46.874089762, 22.227372691), (46.930800973, 22.092696784), (46.976706494, 21.974169098), (47.01069661, 21.87246545), (47.040232567, 21.759531837), (47.060036344, 21.628730002), (47.063442446, 21.473597817), (47.04398075, 21.317905032), (47.002659889, 21.162374658), (46.939281694, 21.008421986), (46.853564753, 20.85703009), (46.74489742, 20.70850973), (46.658043018, 20.61710986), (46.613176061, 20.569894821)],
                knots=[0, 0, 0, 0, 0.000225806, 0.000432038, 0.000618757, 0.00078337, 0.000930533, 0.001057094, 0.001164616, 0.001252039, 0.001407031, 0.001560282, 0.001716124, 0.001876112, 0.002041687, 0.002214184, 0.002396896, 0.002592139, 0.002592139, 0.002592139, 0.002592139], degree=3))
            add(Edge.make_bspline(
                [(46.613176061, 20.569894821), (46.569126322, 20.527766387), (46.48322094, 20.445607918), (46.344937551, 20.337769893), (46.201459977, 20.249060657), (46.054684764, 20.175190487), (45.903812322, 20.117499893), (45.747960005, 20.078411402), (45.588134706, 20.054515857), (45.425166336, 20.049016447), (45.261750204, 20.060503467), (45.099837374, 20.090093569), (44.940420074, 20.137061491), (44.783064378, 20.201422636), (44.630082415, 20.285819879), (44.47836523, 20.385741894), (44.329432935, 20.503970935), (44.235793366, 20.593907726), (44.18786603, 20.639939876)],
                knots=[0, 0, 0, 0, 0.000182782, 0.00035646, 0.00052491, 0.000688061, 0.00084878, 0.001008402, 0.001169167, 0.00133271, 0.001496565, 0.001659716, 0.00182549, 0.001994318, 0.002168663, 0.002348769, 0.002538839, 0.002738119, 0.002738119, 0.002738119, 0.002738119], degree=3))
            add(Edge.make_bspline(
                [(44.18786603, 20.639939876), (44.145004736, 20.685159825), (44.061221536, 20.77355361), (43.947653249, 20.911433756), (43.854604655, 21.054531824), (43.774982521, 21.197423642), (43.711044104, 21.342647093), (43.666035936, 21.491194379), (43.635986948, 21.641741376), (43.625418595, 21.794516332), (43.627341657, 21.949071978), (43.64868316, 22.10547409), (43.685592375, 22.264149168), (43.738504366, 22.424713195), (43.807234359, 22.587547505), (43.894713431, 22.751071451), (43.99672534, 22.917984506), (44.074781701, 23.02682004), (44.114902431, 23.082761171)],
                knots=[0, 0, 0, 0, 0.000186906, 0.000365356, 0.000534939, 0.000698221, 0.000855728, 0.001009901, 0.001163013, 0.001315226, 0.001468477, 0.00162595, 0.001787719, 0.001956616, 0.002132518, 0.002317247, 0.002512462, 0.002718922, 0.002718922, 0.002718922, 0.002718922], degree=3))
        make_face()
    extrude(amount=-BOSS_EXTRUDE2_DEPTH)


solid = part.part
